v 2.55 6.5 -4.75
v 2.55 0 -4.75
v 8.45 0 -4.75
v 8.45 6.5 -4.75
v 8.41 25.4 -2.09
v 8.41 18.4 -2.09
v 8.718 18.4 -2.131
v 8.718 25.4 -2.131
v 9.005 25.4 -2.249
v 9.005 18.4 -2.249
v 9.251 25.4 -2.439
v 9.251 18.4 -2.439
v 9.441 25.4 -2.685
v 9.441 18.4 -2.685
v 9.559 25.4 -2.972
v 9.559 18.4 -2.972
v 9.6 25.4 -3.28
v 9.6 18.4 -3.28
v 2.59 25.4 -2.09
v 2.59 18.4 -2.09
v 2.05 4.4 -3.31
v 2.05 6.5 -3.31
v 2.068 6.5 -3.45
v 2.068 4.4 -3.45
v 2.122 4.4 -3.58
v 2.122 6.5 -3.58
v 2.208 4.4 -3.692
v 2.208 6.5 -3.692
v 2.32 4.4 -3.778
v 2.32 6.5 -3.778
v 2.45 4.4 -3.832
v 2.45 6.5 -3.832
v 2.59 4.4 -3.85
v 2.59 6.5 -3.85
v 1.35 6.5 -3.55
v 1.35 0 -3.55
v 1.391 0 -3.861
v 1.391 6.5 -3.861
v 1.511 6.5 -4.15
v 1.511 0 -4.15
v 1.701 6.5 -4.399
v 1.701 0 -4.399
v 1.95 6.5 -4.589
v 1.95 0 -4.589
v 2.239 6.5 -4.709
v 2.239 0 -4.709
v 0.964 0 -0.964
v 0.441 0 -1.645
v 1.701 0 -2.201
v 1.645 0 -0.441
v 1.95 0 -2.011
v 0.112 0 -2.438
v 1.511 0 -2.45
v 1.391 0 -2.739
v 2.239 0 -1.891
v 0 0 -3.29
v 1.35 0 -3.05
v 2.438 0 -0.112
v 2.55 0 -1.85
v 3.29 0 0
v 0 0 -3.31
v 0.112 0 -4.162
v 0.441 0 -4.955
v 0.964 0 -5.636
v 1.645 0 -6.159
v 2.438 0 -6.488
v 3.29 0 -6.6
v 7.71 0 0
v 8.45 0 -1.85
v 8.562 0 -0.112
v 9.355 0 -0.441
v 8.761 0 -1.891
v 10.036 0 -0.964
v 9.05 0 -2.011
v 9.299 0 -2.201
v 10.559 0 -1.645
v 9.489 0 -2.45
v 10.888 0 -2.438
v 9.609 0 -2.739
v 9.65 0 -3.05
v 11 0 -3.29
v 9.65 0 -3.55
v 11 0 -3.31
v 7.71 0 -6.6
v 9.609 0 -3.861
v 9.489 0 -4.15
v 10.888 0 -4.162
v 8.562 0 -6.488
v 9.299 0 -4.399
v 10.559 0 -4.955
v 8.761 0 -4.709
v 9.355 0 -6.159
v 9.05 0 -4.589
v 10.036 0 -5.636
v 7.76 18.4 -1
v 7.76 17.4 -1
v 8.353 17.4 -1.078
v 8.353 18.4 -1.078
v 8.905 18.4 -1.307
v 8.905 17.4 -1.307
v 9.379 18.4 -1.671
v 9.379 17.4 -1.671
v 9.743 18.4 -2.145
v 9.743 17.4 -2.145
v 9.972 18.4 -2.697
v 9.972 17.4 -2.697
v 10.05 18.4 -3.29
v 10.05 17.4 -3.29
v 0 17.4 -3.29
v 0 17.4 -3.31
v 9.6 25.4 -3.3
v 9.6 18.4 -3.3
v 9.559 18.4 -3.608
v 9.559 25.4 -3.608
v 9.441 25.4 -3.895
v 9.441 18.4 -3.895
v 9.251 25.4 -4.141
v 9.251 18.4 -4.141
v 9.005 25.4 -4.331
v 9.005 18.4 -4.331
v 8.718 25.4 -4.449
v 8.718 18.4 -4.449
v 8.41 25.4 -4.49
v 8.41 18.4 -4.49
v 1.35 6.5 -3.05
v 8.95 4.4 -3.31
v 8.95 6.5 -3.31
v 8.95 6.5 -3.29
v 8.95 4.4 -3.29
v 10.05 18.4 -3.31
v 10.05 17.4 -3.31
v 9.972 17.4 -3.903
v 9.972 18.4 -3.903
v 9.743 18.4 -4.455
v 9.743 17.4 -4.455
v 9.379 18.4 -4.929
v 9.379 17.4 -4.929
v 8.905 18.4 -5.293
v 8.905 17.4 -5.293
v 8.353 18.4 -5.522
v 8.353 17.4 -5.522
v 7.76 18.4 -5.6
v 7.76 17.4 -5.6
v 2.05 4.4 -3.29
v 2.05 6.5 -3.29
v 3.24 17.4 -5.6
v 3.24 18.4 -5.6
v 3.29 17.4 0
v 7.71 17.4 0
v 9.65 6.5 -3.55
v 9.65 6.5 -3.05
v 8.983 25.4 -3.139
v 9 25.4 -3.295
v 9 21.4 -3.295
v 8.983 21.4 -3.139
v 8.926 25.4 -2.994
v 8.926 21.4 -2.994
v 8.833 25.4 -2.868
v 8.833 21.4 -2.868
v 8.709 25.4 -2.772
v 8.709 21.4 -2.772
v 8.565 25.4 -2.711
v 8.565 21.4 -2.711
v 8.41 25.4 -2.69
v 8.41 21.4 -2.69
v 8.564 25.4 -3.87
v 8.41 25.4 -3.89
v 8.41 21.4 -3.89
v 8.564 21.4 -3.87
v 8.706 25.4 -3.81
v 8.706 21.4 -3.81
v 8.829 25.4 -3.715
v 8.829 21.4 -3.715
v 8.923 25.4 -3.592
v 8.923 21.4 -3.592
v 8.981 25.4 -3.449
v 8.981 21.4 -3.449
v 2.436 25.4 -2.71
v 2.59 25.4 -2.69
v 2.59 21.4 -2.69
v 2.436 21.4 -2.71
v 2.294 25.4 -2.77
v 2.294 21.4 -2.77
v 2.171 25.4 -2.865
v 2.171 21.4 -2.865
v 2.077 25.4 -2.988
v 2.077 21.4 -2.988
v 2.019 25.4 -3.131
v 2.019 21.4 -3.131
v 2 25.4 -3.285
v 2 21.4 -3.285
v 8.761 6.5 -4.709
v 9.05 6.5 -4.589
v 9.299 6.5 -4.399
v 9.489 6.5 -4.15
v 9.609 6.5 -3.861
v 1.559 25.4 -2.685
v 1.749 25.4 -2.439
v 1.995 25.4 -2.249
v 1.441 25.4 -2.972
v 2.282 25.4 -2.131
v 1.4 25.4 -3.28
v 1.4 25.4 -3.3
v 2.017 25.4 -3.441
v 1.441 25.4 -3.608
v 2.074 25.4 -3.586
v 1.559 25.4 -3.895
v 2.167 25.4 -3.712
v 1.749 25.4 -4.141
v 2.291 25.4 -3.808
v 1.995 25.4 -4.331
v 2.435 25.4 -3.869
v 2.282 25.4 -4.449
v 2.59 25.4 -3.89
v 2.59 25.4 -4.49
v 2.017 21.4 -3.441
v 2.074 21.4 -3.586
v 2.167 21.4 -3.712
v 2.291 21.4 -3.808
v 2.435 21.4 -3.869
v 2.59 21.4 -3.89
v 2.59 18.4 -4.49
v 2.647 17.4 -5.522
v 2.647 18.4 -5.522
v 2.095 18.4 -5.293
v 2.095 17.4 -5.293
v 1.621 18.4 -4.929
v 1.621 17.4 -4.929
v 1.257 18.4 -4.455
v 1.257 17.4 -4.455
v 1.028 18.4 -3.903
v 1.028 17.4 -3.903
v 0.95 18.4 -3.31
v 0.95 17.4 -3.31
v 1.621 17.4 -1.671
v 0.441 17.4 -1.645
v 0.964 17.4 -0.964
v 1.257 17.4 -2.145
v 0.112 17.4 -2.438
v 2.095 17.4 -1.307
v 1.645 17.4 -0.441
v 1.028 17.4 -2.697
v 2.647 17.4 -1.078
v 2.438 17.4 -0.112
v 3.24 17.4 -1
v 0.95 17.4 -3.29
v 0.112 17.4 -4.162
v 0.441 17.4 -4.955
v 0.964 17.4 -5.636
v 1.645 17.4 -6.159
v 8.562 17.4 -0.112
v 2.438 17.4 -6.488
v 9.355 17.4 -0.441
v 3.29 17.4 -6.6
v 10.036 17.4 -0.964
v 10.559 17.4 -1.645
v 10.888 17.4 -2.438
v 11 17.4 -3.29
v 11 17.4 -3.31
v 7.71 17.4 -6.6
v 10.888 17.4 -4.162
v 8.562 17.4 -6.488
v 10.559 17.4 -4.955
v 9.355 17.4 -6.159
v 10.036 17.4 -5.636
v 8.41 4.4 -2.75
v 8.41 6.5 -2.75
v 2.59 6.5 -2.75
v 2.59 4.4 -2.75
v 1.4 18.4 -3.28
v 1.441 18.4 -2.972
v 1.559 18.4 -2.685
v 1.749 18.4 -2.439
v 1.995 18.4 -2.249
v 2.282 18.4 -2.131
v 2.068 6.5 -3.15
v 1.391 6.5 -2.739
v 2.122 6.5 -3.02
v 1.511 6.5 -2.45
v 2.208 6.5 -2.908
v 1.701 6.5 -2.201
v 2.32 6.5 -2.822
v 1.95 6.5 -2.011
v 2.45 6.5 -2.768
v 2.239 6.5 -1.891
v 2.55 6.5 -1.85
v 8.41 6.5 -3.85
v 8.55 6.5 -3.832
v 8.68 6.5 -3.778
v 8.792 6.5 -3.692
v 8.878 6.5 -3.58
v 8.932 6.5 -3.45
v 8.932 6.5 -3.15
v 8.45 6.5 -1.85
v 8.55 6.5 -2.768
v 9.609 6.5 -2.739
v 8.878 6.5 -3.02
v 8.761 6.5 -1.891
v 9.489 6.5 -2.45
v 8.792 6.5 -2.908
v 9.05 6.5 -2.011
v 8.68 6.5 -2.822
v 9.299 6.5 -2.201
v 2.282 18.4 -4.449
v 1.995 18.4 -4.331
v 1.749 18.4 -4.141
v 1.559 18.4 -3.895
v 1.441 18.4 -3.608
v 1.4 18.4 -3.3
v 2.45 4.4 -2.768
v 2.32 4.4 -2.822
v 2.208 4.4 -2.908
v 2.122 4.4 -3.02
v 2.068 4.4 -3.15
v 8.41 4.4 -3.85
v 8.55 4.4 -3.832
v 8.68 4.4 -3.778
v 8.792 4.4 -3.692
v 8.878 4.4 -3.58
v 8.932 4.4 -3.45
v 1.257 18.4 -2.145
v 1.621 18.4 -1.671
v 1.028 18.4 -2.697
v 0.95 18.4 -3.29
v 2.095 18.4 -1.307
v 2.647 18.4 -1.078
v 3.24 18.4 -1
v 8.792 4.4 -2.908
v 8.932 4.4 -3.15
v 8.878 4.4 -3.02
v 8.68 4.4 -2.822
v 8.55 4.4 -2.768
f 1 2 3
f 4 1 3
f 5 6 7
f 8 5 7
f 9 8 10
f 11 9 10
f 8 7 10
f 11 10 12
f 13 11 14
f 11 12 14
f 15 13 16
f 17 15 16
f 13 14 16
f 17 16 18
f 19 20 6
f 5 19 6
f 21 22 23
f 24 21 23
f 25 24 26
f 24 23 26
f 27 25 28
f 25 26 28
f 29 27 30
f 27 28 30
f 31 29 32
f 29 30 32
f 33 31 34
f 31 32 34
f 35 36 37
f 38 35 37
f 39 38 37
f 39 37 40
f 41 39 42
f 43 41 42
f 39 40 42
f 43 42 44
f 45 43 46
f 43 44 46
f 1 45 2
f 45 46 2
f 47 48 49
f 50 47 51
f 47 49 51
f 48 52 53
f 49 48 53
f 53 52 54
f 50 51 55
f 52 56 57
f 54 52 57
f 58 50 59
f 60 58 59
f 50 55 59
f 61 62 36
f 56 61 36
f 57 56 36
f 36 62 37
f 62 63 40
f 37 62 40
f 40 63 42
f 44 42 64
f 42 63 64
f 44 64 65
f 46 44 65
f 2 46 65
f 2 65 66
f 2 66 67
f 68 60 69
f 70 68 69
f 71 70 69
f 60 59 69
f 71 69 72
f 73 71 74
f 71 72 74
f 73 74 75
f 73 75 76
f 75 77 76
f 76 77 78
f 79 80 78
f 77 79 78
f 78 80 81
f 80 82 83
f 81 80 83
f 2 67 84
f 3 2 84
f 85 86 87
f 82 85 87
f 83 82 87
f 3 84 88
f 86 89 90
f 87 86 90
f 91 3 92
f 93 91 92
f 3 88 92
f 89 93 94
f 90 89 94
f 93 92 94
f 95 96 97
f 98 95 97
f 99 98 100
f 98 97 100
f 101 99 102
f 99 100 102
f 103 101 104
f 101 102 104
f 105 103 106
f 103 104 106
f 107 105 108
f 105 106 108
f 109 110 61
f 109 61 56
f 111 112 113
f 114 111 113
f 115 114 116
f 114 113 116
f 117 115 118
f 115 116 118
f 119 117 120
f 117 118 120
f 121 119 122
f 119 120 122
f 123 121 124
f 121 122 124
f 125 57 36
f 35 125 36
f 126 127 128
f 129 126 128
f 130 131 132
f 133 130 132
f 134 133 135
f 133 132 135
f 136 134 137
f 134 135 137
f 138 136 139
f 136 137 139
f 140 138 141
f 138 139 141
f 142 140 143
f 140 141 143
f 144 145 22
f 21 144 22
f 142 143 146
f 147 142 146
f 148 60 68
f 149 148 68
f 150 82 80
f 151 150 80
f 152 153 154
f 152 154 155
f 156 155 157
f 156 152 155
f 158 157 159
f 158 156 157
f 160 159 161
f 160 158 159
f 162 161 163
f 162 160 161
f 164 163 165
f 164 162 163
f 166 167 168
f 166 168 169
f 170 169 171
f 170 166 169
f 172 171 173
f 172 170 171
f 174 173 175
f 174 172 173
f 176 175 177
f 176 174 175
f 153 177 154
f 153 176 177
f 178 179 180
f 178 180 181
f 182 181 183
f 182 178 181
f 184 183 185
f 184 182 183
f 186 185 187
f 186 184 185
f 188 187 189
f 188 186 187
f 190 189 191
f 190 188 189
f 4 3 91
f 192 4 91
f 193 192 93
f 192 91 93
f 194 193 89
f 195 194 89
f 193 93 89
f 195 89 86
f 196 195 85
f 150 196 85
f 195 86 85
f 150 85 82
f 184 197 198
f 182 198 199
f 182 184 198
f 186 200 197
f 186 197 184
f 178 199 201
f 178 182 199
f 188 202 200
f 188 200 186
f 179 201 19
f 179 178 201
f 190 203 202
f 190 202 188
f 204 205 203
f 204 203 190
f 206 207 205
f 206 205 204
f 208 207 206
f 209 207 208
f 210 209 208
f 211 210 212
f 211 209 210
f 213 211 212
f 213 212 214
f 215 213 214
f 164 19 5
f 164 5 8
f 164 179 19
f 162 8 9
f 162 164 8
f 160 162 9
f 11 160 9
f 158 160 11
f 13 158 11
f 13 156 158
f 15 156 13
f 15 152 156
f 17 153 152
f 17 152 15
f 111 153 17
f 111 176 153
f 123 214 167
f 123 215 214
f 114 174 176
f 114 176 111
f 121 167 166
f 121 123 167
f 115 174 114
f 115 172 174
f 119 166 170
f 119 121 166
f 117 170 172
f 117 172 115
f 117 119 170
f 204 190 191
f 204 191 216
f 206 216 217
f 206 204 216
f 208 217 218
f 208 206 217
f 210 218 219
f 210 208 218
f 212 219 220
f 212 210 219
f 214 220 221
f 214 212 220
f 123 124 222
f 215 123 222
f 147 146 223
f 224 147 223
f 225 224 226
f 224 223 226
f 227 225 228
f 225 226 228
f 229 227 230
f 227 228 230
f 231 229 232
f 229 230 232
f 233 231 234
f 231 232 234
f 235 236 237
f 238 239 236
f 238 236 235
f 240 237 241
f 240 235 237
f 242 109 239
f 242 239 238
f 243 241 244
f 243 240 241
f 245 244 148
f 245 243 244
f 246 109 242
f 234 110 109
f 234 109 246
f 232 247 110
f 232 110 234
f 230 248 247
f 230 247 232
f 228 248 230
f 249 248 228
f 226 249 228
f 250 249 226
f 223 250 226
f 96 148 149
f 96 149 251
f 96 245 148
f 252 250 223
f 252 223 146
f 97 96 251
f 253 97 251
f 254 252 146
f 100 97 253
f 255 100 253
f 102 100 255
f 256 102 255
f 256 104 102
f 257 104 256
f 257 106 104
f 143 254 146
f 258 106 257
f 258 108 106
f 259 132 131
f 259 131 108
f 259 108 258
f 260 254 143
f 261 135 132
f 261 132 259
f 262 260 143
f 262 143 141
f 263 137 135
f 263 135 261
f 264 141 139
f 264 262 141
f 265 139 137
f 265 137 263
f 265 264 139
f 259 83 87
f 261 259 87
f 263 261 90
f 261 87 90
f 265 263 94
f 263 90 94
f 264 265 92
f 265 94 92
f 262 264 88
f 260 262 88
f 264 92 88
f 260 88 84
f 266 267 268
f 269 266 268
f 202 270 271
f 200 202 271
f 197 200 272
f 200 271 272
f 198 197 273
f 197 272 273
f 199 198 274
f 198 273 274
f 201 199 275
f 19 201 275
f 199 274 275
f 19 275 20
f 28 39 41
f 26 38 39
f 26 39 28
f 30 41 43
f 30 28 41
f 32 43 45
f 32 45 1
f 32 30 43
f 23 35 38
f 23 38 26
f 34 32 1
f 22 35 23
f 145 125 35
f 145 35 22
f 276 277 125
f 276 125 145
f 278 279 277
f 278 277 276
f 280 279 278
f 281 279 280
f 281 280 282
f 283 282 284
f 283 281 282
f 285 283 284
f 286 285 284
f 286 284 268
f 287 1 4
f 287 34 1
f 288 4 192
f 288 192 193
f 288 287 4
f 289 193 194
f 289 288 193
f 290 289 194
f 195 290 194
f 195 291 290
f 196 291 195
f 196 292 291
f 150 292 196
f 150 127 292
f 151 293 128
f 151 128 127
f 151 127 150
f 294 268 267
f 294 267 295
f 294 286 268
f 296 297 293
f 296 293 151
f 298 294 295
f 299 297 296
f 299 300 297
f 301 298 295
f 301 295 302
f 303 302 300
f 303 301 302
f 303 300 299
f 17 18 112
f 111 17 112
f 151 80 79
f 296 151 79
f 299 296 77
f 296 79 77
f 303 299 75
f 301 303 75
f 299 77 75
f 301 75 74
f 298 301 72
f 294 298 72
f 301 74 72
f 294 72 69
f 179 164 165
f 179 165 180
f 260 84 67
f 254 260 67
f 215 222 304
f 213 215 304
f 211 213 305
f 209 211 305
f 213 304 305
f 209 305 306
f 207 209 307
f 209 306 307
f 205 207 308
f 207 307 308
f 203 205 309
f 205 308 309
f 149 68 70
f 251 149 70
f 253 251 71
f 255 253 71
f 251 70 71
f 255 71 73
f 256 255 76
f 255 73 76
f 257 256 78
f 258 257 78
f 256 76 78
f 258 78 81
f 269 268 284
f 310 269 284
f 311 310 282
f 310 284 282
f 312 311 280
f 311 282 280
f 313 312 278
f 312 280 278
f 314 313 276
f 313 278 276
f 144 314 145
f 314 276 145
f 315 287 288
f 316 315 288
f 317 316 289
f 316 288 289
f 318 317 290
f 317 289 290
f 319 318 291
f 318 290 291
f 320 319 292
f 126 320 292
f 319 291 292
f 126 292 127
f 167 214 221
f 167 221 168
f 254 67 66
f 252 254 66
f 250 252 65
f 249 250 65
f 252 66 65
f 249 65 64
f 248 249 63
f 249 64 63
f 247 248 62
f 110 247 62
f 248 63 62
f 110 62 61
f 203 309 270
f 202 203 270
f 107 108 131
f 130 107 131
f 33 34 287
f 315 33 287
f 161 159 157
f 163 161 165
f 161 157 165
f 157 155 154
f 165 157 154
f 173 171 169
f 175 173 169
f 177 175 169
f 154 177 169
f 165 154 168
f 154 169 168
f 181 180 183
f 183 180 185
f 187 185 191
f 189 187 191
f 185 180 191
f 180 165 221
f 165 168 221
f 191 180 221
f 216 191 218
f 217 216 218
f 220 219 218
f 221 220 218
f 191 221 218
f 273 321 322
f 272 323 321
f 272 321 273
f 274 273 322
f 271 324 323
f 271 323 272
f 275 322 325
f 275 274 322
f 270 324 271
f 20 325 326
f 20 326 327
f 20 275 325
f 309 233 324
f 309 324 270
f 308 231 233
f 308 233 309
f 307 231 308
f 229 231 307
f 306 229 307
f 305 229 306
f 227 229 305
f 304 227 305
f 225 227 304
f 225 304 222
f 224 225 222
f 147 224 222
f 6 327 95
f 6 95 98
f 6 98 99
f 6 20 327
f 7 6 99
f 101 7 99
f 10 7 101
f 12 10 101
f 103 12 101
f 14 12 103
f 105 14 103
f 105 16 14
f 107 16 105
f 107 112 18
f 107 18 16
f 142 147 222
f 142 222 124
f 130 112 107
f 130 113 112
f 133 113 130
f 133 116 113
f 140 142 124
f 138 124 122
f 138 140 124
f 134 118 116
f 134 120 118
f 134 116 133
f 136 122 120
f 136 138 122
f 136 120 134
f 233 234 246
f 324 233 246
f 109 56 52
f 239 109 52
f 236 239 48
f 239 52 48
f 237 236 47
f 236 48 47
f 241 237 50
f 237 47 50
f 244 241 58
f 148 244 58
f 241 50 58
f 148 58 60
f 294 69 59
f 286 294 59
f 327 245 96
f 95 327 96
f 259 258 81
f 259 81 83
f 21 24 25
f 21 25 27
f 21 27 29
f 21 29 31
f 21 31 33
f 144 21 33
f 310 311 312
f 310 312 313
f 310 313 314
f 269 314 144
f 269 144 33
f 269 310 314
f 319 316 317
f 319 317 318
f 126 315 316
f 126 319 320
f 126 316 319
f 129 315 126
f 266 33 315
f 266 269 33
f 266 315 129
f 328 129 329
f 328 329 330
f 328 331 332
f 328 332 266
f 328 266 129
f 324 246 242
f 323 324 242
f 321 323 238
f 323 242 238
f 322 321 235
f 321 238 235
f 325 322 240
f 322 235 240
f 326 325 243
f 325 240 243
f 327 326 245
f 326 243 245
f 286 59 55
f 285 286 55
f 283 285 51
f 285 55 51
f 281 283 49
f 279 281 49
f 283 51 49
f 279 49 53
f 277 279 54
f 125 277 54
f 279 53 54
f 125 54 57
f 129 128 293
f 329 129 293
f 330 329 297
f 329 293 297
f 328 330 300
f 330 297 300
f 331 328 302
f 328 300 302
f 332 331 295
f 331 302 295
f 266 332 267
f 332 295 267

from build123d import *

# Parameters (mm, degrees)
BOSS_EXTRUDE1_DEPTH = 17.4
BOSS_EXTRUDE2_DEPTH = 1
BOSS_EXTRUDE3_DEPTH = 7
CUT_EXTRUDE1_DEPTH  = 4
CUT_EXTRUDE2_DEPTH  = 6.5
BOSS_EXTRUDE4_DEPTH = 2.1


with BuildPart() as part:
    # Sketch1 → Boss-Extrude1 (new body)
    with BuildSketch(Plane(origin=(0, 0, 0), x_dir=(1, 0, 0), z_dir=(0, 1, 0))):
        with BuildLine():
            Line((3.29, 0), (7.71, 0))
            ThreePointArc((7.71, 0), (10.03638131, 0.96361869), (11, 3.29))
            Line((11, 3.29), (11, 3.31))
            ThreePointArc((11, 3.31), (10.03638131, 5.63638131), (7.71, 6.6))
            Line((7.71, 6.6), (3.29, 6.6))
            ThreePointArc((3.29, 6.6), (0.96361869, 5.63638131), (0, 3.31))
            Line((0, 3.31), (0, 3.29))
            ThreePointArc((0, 3.29), (0.96361869, 0.96361869), (3.29, 0))
        make_face()
    extrude(amount=BOSS_EXTRUDE1_DEPTH)

    # Sketch2 → Boss-Extrude2 (add)
    with BuildSketch(Plane(origin=(0, 17.4, 0), x_dir=(1, 0, 0), z_dir=(0, 1, 0))):
        with BuildLine():
            Line((3.24, 1), (7.76, 1))
            ThreePointArc((7.76, 1), (9.379274529, 1.670725471), (10.05, 3.29))
            Line((10.05, 3.29), (10.05, 3.31))
            ThreePointArc((10.05, 3.31), (9.379274529, 4.929274529), (7.76, 5.6))
            Line((7.76, 5.6), (3.24, 5.6))
            ThreePointArc((3.24, 5.6), (1.620725471, 4.929274529), (0.95, 3.31))
            Line((0.95, 3.31), (0.95, 3.29))
            ThreePointArc((0.95, 3.29), (1.620725471, 1.670725471), (3.24, 1))
        make_face()
    extrude(amount=BOSS_EXTRUDE2_DEPTH)

    # Sketch3 → Boss-Extrude3 (add)
    with BuildSketch(Plane(origin=(0, 18.4, 0), x_dir=(1, 0, 0), z_dir=(0, 1, 0))):
        with BuildLine():
            Line((2.59, 2.09), (8.41, 2.09))
            ThreePointArc((8.41, 2.09), (9.25145707, 2.43854293), (9.6, 3.28))
            Line((9.6, 3.28), (9.6, 3.3))
            ThreePointArc((9.6, 3.3), (9.25145707, 4.14145707), (8.41, 4.49))
            Line((8.41, 4.49), (2.59, 4.49))
            ThreePointArc((2.59, 4.49), (1.74854293, 4.14145707), (1.4, 3.3))
            Line((1.4, 3.3), (1.4, 3.28))
            ThreePointArc((1.4, 3.28), (1.74854293, 2.43854293), (2.59, 2.09))
        make_face()
    extrude(amount=BOSS_EXTRUDE3_DEPTH)

    # Sketch4 → Cut-Extrude1 (cut)
    with BuildSketch(Plane(origin=(0, 25.4, 0), x_dir=(1, 0, 0), z_dir=(0, 1, 0))):
        with BuildLine():
            Line((2.59, 3.89), (8.41, 3.89))
            ThreePointArc((8.41, 3.89), (8.828957038, 3.715421473), (8.999978813, 3.295))
            ThreePointArc((8.999978813, 3.295), (8.832522189, 2.868133654), (8.41, 2.69))
            Line((8.41, 2.69), (2.59, 2.69))
            ThreePointArc((2.59, 2.69), (2.171042962, 2.864578527), (2.000021187, 3.285))
            ThreePointArc((2.000021187, 3.285), (2.167477811, 3.711866346), (2.59, 3.89))
        make_face()
    extrude(amount=-CUT_EXTRUDE1_DEPTH, mode=Mode.SUBTRACT)

    # Sketch5 → Cut-Extrude2 (cut)
    with BuildSketch(Plane.XZ):
        with BuildLine():
            Line((2.55, -4.75), (8.45, -4.75))
            ThreePointArc((8.45, -4.75), (9.298528137, -4.398528137), (9.65, -3.55))
            Line((9.65, -3.55), (9.65, -3.05))
            ThreePointArc((9.65, -3.05), (9.298528137, -2.201471863), (8.45, -1.85))
            Line((8.45, -1.85), (2.55, -1.85))
            ThreePointArc((2.55, -1.85), (1.701471863, -2.201471863), (1.35, -3.05))
            Line((1.35, -3.05), (1.35, -3.55))
            ThreePointArc((1.35, -3.55), (1.701471863, -4.398528137), (2.55, -4.75))
        make_face()
    extrude(amount=-CUT_EXTRUDE2_DEPTH, mode=Mode.SUBTRACT)

    # Sketch6 → Boss-Extrude4 (add)
    with BuildSketch(Plane.XZ.offset(-6.5)):
        with BuildLine():
            Line((2.59, -3.85), (8.41, -3.85))
            ThreePointArc((8.41, -3.85), (8.791837662, -3.691837662), (8.95, -3.31))
            Line((8.95, -3.31), (8.95, -3.29))
            ThreePointArc((8.95, -3.29), (8.791837662, -2.908162338), (8.41, -2.75))
            Line((8.41, -2.75), (2.59, -2.75))
            ThreePointArc((2.59, -2.75), (2.208162338, -2.908162338), (2.05, -3.29))
            Line((2.05, -3.29), (2.05, -3.31))
            ThreePointArc((2.05, -3.31), (2.208162338, -3.691837662), (2.59, -3.85))
        make_face()
    extrude(amount=BOSS_EXTRUDE4_DEPTH)


solid = part.part
